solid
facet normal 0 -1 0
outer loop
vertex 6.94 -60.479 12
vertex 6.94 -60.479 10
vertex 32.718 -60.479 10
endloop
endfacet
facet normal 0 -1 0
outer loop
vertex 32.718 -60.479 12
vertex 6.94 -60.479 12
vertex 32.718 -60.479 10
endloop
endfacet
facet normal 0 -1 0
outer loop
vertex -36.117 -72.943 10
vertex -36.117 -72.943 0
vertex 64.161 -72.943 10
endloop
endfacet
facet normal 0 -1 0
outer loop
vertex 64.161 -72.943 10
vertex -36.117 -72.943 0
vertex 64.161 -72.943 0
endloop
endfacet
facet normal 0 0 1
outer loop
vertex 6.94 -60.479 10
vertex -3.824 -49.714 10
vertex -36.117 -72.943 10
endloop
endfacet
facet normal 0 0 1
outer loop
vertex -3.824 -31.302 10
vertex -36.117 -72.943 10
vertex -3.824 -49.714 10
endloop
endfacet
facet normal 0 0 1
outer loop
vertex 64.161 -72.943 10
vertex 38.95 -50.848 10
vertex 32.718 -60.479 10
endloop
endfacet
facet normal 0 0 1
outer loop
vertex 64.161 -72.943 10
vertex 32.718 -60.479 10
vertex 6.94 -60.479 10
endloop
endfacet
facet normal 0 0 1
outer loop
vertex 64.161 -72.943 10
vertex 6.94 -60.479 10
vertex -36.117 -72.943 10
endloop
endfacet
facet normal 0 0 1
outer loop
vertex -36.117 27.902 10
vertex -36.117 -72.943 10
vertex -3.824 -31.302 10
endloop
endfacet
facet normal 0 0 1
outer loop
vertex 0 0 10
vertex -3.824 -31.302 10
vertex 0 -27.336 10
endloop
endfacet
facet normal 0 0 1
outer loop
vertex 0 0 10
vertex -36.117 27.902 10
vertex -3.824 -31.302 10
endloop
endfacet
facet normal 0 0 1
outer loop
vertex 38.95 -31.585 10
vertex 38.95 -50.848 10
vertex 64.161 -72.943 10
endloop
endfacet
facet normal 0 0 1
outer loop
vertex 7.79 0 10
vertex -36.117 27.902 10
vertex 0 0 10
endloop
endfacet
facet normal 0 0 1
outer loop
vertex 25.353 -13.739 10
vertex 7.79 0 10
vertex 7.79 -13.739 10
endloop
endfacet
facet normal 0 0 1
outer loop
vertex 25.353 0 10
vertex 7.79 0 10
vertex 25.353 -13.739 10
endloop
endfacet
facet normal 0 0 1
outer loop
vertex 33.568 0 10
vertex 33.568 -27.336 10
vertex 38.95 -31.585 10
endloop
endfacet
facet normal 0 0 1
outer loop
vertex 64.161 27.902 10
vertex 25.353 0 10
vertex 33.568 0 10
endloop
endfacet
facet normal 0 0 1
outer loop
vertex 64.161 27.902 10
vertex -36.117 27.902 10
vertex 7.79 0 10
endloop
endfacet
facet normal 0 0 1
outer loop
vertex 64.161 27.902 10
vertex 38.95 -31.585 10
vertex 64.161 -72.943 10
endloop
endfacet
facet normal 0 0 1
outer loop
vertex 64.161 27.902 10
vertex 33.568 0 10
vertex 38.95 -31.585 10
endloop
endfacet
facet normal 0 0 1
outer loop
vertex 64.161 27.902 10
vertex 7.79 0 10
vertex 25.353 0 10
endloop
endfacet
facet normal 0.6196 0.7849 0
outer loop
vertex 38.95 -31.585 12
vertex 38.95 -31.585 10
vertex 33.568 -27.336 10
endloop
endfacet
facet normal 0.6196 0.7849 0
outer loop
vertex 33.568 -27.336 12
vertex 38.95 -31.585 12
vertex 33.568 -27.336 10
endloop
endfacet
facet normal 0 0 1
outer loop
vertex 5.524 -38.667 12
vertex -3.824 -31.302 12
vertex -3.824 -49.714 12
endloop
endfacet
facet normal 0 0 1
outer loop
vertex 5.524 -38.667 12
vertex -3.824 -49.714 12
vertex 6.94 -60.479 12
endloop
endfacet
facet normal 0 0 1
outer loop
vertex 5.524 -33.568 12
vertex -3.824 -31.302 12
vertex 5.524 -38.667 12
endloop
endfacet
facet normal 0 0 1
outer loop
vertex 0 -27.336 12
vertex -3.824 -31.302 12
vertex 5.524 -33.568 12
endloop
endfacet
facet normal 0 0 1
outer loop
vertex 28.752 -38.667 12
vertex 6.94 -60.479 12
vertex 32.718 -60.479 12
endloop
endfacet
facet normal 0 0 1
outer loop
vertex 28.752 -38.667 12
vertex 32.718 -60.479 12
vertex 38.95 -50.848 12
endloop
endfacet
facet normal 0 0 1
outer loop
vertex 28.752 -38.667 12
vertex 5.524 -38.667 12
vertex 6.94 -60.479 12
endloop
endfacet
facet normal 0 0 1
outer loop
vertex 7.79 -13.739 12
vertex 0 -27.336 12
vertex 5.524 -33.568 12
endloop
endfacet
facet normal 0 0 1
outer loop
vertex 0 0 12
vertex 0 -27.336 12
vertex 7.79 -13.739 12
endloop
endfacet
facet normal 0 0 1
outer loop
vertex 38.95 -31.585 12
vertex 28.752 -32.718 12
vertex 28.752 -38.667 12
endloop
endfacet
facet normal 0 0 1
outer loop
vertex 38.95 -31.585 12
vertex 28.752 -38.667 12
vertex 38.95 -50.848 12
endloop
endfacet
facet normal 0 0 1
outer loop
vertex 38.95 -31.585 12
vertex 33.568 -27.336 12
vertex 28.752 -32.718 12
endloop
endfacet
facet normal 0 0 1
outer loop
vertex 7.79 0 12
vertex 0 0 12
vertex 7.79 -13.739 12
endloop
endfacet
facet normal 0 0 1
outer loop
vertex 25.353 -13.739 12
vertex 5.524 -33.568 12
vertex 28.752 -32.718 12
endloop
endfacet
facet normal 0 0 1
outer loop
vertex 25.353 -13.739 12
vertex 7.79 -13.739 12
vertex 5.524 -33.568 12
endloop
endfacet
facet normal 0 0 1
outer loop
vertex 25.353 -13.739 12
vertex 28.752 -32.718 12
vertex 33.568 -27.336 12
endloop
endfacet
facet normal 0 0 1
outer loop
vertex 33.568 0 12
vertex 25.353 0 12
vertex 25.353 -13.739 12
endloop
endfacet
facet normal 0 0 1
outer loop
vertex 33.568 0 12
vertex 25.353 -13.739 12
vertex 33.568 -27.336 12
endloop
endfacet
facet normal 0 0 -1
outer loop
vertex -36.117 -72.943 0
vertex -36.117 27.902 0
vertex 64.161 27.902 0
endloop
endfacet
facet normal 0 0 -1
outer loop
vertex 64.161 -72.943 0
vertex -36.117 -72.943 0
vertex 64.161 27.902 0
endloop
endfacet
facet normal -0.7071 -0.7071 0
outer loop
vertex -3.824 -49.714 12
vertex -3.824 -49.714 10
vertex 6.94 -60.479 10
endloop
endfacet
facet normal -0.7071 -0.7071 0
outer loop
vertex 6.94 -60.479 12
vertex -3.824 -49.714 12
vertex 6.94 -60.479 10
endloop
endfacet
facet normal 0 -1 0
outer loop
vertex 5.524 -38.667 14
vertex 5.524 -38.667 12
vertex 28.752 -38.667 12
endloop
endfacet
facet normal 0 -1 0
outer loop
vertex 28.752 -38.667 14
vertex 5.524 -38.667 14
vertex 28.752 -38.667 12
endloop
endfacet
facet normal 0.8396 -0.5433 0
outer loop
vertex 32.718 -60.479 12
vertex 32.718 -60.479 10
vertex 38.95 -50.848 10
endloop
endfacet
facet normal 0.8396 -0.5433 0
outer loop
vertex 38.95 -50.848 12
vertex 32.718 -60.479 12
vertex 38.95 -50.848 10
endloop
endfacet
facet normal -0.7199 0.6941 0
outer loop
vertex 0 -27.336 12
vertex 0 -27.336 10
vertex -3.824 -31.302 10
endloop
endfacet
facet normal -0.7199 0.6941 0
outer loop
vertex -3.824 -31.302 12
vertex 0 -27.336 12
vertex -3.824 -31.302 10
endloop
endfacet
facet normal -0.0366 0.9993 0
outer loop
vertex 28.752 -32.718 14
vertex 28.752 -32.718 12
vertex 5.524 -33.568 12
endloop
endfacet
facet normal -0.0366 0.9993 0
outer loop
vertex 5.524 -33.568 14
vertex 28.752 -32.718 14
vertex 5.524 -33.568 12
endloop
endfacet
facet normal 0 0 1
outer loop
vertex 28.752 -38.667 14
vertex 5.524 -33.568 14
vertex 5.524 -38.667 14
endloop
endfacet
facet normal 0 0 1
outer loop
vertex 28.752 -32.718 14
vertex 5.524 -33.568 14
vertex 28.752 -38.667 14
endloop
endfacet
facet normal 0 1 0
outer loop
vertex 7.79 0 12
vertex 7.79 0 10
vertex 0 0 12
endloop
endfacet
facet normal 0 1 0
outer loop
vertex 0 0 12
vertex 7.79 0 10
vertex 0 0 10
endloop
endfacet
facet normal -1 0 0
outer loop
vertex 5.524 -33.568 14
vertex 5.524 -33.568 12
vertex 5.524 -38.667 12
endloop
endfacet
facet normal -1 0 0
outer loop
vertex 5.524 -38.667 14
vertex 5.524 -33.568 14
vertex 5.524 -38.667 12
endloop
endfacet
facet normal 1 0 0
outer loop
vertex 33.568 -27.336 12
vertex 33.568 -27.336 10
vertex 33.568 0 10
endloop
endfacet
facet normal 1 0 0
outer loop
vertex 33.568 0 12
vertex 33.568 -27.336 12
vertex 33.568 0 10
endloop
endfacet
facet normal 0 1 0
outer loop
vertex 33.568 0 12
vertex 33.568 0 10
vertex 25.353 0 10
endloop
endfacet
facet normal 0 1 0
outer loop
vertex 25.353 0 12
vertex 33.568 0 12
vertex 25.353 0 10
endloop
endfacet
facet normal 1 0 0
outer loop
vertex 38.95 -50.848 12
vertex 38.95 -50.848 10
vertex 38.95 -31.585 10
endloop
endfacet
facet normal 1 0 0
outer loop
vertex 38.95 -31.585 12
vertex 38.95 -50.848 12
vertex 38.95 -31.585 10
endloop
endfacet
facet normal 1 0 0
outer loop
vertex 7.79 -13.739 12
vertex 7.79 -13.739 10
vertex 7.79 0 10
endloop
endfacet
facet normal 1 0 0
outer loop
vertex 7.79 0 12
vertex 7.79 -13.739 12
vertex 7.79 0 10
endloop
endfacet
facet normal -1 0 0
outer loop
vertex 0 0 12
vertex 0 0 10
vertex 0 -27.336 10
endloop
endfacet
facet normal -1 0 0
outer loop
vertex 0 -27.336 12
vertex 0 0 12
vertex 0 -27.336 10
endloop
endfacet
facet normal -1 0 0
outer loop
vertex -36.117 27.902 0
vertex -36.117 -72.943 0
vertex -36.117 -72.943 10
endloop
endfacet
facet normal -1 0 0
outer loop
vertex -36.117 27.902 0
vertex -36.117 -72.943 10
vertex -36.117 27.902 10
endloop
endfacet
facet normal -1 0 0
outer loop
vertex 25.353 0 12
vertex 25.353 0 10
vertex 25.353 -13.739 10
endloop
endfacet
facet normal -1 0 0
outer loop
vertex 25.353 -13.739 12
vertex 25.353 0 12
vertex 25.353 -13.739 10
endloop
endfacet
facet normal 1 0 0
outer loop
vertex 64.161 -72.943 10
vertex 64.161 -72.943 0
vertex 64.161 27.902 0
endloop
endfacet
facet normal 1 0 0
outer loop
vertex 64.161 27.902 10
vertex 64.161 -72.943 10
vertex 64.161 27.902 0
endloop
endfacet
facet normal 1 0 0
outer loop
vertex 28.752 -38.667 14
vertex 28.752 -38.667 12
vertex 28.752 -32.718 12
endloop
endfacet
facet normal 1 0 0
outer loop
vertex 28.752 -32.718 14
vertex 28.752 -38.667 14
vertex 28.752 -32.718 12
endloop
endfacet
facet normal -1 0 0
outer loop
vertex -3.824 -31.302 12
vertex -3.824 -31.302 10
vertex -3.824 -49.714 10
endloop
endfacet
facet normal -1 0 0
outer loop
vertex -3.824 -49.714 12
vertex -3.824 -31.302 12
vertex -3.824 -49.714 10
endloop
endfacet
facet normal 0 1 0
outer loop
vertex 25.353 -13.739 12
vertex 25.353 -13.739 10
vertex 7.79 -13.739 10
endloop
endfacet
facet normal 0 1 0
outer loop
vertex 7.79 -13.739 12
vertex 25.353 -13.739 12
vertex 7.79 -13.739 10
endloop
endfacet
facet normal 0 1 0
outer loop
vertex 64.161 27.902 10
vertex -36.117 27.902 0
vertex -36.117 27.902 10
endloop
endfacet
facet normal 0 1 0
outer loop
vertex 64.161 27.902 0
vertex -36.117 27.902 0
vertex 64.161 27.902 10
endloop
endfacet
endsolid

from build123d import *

# Parameters (mm, degrees)
F0_W     = 100.278783
F0_H     = 100.845326
F1_DEPTH = 10
F3_DEPTH = 2
F4_W     = 20.395683
F4_H     = 3.682554
F5_DEPTH = 2
F7_DEPTH = 2


with BuildPart() as f1:
    # F0 (on Top) → F1 (new body)
    with BuildSketch(Plane.XY):
        with Locations((14.022036, -22.520235)):
            Rectangle(F0_W, F0_H)
    extrude(amount=F1_DEPTH)

    # F2 (on face) → F3 (join)
    with BuildSketch(Plane.XY.offset(10)):
        Polygon((7.790018, 0), (0, 0), (0, -27.335884), (-3.824191, -31.301711), (-3.824191, -49.71448), (6.940198, -60.478866), (32.718081, -60.478866), (38.950093, -50.847575), (38.950093, -31.584986), (33.567898, -27.335884), (33.567898, 0), (25.352968, 0), (25.352968, -13.738759), (7.790018, -13.738759), align=None)
    extrude(amount=F3_DEPTH)

    # F4 (on face) → F5 (join)
    with BuildSketch(Plane.XY.offset(12)):
        with Locations((17.987859, -37.675362)):
            Rectangle(F4_W, F4_H)
    extrude(amount=-F5_DEPTH)

    # F6 (on face) → F7 (join)
    with BuildSketch(Plane.XY.offset(12)):
        Polygon((28.752247, -32.718077), (5.523832, -33.567894), (5.523832, -38.666818), (28.752247, -38.666818), align=None)
    extrude(amount=F7_DEPTH)


solid = f1.part
